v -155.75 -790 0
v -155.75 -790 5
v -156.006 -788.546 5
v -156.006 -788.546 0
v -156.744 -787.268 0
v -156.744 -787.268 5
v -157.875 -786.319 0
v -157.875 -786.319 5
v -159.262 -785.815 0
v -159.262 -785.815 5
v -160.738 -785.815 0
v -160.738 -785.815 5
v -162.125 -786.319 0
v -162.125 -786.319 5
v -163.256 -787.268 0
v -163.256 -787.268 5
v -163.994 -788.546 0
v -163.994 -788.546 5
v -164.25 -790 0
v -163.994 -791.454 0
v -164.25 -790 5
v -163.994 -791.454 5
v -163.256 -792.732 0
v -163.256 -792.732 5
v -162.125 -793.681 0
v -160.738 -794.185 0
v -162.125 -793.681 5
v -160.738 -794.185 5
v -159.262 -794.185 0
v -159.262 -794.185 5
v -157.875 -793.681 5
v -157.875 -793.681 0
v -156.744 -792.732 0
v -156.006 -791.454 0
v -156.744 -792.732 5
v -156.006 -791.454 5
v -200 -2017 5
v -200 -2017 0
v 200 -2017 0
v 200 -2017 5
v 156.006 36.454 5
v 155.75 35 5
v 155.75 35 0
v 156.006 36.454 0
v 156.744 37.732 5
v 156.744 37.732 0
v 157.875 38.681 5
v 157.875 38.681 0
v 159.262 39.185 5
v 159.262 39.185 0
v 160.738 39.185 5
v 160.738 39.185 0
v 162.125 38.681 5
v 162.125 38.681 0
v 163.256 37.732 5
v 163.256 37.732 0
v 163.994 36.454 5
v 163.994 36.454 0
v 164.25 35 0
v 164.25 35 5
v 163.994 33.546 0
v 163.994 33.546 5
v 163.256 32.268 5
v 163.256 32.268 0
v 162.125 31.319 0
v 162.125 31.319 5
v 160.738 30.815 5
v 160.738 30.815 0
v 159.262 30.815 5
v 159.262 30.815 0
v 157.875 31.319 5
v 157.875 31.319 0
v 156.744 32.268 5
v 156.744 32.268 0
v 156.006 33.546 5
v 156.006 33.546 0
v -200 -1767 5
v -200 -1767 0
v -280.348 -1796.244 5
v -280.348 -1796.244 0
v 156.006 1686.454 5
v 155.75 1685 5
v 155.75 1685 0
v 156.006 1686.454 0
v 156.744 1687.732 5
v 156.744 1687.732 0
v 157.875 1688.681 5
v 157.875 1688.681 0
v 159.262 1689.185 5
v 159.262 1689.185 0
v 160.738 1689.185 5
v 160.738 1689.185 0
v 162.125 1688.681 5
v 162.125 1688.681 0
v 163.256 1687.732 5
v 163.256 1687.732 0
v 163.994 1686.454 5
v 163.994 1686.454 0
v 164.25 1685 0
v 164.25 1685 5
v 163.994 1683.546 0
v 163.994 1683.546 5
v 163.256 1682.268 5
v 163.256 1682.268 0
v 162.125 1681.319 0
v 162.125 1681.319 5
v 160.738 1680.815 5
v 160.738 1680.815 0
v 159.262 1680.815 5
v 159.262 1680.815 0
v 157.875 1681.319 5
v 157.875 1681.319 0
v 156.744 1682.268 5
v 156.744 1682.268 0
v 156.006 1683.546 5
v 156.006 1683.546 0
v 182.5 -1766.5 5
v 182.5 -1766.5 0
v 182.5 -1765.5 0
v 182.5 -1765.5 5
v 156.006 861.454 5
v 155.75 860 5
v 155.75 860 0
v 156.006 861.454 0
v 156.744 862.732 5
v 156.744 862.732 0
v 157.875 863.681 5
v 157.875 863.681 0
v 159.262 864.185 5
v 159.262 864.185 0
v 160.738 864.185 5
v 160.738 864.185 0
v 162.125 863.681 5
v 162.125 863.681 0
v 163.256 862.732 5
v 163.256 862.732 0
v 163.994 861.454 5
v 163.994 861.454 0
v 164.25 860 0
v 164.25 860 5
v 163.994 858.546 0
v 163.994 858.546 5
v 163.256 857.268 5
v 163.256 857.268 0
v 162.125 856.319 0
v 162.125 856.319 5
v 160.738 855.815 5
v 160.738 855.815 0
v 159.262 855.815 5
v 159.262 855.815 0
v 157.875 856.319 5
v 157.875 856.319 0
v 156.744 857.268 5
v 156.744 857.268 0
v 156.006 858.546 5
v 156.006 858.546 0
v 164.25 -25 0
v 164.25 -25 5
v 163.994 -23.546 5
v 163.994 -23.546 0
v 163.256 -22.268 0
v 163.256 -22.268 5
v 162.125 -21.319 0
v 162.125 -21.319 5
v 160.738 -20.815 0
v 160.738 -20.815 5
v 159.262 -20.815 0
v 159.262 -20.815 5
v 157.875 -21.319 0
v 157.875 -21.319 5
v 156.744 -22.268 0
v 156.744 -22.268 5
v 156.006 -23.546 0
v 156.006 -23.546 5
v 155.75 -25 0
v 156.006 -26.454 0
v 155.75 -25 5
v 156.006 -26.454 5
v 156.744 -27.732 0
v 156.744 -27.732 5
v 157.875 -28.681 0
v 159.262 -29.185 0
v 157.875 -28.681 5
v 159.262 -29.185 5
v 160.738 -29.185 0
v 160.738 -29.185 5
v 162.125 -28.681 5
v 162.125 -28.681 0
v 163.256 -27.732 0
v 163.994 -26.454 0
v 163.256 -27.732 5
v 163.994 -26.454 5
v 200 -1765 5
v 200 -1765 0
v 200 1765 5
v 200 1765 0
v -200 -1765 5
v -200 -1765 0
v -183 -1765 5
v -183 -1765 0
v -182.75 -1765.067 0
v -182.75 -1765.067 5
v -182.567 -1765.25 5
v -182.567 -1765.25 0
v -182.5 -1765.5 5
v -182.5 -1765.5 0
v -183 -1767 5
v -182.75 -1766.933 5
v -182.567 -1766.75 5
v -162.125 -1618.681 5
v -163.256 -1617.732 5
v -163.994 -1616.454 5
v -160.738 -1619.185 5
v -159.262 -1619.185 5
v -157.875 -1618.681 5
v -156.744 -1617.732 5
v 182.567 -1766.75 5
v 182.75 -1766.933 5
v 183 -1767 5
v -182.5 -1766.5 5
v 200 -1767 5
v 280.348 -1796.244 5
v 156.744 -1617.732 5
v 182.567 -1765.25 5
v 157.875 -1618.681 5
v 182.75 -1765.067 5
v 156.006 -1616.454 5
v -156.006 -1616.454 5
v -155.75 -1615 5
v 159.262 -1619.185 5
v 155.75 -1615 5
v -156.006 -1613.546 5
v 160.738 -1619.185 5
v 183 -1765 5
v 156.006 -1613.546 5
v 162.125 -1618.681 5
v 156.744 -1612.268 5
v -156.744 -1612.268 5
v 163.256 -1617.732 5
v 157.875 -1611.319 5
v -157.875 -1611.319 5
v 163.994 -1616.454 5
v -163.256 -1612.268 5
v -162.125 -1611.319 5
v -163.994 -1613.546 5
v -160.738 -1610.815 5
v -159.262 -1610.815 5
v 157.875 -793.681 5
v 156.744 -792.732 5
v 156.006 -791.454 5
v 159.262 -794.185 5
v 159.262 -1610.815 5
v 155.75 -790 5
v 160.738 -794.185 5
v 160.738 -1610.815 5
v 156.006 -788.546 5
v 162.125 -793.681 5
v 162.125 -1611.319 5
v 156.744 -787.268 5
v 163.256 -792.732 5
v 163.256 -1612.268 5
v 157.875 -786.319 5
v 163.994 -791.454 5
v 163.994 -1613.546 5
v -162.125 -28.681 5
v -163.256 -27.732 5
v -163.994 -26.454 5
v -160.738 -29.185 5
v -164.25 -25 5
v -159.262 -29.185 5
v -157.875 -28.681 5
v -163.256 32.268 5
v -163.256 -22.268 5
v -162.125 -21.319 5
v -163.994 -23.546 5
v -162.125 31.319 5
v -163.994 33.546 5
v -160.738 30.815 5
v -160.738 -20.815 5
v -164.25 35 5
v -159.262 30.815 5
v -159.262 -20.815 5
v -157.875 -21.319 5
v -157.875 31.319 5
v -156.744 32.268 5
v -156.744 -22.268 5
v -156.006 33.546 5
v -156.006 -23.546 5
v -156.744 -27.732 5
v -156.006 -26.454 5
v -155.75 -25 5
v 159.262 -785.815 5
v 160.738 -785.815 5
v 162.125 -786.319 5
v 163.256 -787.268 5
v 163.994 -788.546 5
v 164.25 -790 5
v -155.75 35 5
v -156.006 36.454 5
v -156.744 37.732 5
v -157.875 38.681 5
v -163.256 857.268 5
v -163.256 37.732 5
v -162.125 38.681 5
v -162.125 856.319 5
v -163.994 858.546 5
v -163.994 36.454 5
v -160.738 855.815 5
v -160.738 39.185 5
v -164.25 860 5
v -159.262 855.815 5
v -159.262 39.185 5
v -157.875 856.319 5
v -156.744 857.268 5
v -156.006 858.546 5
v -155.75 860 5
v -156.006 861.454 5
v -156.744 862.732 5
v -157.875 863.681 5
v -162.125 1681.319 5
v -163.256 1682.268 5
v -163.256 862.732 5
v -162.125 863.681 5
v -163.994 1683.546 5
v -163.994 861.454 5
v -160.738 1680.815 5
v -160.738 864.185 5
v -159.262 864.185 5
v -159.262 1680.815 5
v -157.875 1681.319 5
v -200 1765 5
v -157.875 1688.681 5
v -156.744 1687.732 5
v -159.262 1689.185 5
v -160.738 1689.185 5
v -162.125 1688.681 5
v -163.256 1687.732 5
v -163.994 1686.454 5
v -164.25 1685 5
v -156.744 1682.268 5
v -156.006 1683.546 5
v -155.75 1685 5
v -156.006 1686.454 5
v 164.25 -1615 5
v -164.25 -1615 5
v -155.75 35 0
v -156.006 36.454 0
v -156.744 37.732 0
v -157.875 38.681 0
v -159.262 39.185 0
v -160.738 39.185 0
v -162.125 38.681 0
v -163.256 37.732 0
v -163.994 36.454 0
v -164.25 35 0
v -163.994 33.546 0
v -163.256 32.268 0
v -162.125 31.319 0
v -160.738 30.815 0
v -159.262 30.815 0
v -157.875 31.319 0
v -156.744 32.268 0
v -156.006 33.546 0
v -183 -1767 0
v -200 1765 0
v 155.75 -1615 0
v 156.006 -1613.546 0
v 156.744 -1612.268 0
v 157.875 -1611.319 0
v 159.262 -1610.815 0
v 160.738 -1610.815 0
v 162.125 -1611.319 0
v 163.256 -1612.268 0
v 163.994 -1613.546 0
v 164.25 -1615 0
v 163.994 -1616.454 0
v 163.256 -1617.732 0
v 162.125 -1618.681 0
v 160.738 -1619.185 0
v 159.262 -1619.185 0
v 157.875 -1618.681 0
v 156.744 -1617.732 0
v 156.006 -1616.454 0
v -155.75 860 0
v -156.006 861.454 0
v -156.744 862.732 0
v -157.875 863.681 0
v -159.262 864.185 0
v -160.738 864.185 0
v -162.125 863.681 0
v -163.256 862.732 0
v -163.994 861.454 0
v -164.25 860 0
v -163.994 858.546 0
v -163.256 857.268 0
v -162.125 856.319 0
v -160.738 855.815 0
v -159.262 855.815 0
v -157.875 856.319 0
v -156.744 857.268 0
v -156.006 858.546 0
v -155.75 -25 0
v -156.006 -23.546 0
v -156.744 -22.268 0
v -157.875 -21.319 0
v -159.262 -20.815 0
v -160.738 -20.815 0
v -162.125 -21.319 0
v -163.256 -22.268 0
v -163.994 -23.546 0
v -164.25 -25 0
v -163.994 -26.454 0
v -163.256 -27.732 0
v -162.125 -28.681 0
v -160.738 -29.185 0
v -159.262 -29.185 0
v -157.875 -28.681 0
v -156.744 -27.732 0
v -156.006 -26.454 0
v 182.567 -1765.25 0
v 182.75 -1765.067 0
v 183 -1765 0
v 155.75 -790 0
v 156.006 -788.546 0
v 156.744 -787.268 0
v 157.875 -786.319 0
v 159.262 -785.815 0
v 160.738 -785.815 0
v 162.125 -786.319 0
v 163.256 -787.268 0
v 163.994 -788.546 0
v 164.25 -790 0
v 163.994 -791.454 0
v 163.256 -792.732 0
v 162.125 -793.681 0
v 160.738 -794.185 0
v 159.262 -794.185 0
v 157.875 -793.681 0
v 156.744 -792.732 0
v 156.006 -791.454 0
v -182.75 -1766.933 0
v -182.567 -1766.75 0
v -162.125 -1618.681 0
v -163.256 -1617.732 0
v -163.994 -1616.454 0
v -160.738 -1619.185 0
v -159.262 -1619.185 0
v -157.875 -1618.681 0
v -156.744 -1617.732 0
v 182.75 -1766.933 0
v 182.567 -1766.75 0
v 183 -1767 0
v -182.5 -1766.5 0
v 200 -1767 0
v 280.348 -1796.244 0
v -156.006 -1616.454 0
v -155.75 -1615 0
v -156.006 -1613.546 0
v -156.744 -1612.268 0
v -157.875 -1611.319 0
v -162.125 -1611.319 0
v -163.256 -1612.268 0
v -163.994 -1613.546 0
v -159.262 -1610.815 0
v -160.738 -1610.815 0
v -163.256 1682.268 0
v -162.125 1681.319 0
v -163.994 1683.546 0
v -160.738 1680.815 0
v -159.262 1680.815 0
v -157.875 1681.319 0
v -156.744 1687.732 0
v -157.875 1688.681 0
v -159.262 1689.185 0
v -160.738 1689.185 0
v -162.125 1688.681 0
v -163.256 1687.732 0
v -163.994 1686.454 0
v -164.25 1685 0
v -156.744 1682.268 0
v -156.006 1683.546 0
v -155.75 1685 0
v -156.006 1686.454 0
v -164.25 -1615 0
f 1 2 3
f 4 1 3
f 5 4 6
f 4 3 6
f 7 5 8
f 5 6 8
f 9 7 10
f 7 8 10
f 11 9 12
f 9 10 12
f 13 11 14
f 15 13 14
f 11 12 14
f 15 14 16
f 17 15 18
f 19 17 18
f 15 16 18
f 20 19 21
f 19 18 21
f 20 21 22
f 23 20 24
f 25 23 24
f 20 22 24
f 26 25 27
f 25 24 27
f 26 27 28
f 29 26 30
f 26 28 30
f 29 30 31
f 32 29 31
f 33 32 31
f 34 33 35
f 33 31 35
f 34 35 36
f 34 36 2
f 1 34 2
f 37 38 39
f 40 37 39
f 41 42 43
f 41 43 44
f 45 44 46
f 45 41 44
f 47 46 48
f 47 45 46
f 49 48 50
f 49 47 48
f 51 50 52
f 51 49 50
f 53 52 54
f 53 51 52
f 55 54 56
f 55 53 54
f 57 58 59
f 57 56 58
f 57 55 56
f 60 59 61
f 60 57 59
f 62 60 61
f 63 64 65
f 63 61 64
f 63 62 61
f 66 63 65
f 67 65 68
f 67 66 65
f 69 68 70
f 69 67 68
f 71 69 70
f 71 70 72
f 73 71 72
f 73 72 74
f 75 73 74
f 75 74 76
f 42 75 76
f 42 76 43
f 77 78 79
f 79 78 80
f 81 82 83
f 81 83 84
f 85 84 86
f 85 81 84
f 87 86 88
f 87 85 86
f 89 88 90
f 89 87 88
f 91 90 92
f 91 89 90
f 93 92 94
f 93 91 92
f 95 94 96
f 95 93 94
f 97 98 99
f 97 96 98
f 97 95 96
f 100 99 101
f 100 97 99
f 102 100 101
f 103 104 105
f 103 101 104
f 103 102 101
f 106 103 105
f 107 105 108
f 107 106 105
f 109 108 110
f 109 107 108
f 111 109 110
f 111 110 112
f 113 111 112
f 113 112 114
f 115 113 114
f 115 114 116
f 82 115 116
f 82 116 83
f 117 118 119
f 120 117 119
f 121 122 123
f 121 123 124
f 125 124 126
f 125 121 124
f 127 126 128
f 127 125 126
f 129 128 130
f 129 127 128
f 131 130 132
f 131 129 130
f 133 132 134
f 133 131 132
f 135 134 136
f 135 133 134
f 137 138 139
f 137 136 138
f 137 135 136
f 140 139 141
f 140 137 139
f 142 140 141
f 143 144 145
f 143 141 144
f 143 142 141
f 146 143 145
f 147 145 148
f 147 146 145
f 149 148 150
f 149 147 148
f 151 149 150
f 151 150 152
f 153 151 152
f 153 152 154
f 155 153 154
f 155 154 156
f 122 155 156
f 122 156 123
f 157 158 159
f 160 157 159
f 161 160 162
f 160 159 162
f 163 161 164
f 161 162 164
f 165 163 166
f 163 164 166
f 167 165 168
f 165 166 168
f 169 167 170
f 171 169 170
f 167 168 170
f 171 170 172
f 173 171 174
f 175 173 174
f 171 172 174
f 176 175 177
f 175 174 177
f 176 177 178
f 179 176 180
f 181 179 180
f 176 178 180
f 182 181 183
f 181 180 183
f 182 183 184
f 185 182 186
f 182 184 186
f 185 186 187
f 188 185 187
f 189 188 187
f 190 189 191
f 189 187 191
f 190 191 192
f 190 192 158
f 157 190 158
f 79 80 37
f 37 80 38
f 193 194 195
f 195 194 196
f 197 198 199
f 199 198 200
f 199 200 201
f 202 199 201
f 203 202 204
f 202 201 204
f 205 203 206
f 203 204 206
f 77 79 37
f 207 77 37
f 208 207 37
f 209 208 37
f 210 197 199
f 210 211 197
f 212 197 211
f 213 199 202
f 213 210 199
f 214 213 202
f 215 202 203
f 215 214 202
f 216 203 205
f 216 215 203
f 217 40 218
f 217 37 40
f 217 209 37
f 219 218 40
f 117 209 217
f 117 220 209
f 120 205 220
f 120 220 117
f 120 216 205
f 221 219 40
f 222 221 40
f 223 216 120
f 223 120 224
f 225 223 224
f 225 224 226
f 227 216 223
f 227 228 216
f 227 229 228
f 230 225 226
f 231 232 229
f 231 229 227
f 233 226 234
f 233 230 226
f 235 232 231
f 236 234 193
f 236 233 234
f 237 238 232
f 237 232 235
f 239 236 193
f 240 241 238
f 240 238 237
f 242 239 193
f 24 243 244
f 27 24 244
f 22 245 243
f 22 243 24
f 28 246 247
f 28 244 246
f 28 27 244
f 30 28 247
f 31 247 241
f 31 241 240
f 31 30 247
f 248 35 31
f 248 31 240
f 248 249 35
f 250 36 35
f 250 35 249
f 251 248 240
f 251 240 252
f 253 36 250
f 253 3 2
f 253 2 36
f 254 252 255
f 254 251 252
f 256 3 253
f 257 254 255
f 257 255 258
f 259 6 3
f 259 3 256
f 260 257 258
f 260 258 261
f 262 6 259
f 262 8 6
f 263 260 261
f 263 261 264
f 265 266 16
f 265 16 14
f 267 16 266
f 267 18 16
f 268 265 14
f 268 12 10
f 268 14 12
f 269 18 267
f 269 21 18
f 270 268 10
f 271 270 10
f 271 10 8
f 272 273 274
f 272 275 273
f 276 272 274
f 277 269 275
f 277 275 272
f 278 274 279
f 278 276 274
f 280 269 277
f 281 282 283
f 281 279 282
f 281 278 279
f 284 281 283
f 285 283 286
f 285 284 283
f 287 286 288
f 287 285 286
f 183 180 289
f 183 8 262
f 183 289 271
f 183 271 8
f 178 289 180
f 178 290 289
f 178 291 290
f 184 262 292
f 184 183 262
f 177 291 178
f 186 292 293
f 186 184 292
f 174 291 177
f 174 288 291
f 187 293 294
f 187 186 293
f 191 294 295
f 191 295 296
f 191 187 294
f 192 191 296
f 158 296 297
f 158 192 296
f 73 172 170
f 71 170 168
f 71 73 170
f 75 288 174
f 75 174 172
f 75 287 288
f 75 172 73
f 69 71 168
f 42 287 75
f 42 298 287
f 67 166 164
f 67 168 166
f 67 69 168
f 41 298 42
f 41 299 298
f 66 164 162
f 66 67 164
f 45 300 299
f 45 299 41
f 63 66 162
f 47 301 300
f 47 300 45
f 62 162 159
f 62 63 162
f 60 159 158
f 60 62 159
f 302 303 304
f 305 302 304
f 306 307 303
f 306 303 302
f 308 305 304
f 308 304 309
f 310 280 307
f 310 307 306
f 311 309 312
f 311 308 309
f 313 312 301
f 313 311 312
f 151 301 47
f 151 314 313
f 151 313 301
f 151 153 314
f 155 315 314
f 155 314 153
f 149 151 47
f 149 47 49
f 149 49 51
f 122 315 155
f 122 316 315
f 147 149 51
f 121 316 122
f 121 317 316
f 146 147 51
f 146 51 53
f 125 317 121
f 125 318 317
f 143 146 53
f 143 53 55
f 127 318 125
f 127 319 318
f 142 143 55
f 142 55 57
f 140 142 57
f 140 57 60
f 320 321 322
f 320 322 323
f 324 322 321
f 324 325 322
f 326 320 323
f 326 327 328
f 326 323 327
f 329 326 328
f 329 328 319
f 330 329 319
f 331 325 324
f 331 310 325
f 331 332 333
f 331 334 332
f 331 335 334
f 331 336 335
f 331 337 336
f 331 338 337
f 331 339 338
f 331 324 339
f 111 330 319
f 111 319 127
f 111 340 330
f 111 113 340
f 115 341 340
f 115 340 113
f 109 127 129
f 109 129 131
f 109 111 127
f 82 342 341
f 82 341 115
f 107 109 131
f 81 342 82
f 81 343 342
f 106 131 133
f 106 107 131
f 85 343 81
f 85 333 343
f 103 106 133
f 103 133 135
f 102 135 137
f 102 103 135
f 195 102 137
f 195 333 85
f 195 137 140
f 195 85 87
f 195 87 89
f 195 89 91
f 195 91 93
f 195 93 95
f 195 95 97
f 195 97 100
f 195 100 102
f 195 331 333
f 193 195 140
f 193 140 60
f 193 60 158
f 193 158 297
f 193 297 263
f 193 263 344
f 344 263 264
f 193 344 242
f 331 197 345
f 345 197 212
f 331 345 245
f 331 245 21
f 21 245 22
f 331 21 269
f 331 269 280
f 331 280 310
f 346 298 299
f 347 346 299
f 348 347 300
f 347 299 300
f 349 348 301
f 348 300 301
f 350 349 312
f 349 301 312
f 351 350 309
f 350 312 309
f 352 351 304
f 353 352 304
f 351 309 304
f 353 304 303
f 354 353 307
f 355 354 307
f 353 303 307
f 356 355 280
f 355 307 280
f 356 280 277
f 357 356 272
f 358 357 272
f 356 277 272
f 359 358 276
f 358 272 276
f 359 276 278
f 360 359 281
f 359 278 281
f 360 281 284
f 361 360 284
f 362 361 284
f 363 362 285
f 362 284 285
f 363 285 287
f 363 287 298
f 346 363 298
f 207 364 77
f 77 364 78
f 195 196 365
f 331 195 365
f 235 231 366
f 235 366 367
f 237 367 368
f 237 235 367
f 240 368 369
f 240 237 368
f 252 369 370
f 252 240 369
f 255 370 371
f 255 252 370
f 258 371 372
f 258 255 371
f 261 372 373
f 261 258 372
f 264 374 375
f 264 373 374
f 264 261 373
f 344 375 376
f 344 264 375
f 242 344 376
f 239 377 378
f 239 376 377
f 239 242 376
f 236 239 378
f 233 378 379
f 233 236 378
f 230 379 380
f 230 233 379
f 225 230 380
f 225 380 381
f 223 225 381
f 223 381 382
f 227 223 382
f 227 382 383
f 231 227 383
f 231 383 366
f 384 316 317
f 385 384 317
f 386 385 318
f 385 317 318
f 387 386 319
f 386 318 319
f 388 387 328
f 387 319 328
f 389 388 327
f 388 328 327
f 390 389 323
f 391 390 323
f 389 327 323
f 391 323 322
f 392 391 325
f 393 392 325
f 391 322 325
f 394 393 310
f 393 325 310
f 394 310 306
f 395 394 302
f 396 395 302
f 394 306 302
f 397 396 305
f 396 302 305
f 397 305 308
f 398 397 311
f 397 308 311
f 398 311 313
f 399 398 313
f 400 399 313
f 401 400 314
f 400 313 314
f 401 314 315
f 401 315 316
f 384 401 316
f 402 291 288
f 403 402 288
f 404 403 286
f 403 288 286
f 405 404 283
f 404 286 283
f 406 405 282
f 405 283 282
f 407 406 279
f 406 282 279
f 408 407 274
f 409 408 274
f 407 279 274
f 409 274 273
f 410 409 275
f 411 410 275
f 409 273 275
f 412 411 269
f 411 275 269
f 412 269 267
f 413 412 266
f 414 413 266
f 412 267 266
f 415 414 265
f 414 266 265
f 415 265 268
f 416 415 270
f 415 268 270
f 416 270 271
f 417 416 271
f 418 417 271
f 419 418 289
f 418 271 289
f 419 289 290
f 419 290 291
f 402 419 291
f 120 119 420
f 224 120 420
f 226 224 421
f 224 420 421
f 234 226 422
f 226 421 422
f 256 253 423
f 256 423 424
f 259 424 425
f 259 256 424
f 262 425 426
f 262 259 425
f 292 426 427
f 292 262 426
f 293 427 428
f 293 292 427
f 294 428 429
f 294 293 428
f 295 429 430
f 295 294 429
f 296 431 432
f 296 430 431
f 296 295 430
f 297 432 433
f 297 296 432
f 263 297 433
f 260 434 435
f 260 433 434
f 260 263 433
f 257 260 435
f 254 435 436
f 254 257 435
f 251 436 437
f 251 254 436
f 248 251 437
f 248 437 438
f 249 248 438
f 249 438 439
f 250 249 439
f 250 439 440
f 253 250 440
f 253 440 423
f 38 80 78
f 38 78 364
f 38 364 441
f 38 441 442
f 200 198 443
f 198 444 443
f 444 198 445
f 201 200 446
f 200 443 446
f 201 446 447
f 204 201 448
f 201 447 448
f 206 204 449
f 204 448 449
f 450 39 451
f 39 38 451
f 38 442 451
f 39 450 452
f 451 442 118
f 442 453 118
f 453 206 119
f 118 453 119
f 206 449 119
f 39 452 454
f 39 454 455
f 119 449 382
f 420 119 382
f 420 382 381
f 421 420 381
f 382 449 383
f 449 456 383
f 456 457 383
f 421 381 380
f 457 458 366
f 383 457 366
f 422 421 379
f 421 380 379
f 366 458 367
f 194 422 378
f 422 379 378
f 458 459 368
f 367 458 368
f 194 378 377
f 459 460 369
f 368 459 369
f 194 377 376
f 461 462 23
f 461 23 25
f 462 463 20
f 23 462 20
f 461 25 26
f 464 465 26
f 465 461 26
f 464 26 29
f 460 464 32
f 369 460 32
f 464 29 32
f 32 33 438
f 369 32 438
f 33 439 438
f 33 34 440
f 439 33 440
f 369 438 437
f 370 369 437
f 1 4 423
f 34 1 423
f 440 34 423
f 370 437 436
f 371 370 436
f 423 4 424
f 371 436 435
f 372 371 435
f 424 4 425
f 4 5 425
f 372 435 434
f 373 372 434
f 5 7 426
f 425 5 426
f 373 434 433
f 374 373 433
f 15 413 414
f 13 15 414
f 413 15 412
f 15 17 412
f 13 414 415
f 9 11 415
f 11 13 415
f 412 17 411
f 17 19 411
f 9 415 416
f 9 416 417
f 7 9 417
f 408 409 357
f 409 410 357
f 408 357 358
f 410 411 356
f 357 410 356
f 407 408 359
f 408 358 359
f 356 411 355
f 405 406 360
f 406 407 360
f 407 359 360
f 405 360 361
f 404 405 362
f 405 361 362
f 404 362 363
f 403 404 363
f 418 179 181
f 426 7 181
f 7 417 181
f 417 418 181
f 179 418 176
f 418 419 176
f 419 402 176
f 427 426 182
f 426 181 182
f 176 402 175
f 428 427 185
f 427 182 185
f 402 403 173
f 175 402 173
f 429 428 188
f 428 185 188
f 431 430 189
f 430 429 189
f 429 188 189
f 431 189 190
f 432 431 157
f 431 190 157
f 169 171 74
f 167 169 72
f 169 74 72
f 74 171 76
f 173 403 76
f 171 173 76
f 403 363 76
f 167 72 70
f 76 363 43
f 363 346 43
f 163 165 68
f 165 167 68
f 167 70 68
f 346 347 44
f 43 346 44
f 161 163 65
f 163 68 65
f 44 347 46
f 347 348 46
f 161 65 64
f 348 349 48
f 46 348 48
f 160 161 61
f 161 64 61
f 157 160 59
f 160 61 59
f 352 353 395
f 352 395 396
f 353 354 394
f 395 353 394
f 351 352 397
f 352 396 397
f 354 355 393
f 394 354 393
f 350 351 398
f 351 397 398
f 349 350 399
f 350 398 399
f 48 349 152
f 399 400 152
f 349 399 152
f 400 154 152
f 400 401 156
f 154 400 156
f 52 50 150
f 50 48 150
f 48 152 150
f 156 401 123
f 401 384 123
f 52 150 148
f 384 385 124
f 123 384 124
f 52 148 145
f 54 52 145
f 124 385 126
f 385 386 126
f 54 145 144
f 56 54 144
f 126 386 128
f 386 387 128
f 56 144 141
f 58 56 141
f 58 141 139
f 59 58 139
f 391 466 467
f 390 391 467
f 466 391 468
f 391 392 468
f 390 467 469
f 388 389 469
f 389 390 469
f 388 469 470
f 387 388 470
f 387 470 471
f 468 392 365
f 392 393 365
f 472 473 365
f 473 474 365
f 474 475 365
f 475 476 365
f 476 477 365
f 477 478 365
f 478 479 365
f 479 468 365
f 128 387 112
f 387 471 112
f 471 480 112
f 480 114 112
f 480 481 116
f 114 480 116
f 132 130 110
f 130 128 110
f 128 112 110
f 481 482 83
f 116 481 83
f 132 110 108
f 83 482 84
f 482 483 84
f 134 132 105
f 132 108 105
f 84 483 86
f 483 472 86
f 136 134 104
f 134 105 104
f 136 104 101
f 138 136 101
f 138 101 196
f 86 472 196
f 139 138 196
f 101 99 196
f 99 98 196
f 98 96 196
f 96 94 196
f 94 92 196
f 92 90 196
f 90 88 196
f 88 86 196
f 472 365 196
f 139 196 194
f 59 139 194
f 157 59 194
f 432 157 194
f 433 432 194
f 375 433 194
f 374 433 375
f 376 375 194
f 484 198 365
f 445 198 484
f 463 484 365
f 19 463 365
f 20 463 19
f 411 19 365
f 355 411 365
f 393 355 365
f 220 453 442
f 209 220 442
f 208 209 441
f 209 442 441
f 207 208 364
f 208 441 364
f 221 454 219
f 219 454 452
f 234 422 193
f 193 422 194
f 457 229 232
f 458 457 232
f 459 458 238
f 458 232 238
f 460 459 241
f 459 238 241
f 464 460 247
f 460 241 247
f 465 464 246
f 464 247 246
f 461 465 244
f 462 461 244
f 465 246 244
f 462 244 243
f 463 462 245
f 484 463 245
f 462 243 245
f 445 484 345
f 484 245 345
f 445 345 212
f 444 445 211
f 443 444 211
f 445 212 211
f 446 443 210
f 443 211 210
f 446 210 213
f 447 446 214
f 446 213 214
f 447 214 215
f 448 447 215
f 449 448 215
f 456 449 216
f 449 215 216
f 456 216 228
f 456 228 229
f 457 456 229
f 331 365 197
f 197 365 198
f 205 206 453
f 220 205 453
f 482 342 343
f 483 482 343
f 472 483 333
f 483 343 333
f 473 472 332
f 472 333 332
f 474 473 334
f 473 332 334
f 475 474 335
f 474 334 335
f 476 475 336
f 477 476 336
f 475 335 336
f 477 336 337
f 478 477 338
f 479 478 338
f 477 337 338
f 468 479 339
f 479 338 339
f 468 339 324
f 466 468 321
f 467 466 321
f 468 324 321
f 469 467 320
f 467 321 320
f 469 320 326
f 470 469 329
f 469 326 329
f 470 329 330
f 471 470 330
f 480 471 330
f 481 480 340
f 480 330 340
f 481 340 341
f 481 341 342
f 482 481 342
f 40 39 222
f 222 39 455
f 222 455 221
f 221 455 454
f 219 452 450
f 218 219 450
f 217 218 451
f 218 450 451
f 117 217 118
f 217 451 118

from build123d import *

# Parameters (mm, degrees)
F1_DEPTH = 5
F2_R     = 4.25
F3_DEPTH = 5.001
F4_R     = 4.25
F5_DEPTH = 5.001


# Not quite as in the source:
# - a pattern or mirror of a feature is missing from the dataset's text; its kind, count and spacing are read off the source's solid


with BuildPart() as f1:
    # F0 (on Top) → F1 (new body)
    with BuildSketch(Plane.XY):
        with BuildLine():
            Line((200, -1765), (200, 1765))
            Line((200, 1765), (-200, 1765))
            Line((-200, 1765), (-200, -1765))
            Line((-200, -1765), (-183, -1765))
            ThreePointArc((-183, -1765), (-182.6464466094, -1765.1464466094), (-182.5, -1765.5))
            Line((-182.5, -1765.5), (-182.5, -1766.5))
            ThreePointArc((-182.5, -1766.5), (-182.6464466094, -1766.8535533906), (-183, -1767))
            Line((-183, -1767), (-200, -1767))
            Line((-200, -1767), (-280.3484512108, -1796.2444446101))
            Line((-280.3484512108, -1796.2444446101), (-200, -2017))
            Line((-200, -2017), (200, -2017))
            Line((200, -2017), (280.3484512108, -1796.2444446101))
            Line((280.3484512108, -1796.2444446101), (200, -1767))
            Line((200, -1767), (183, -1767))
            ThreePointArc((183, -1767), (182.6464466094, -1766.8535533906), (182.5, -1766.5))
            Line((182.5, -1766.5), (182.5, -1765.5))
            ThreePointArc((182.5, -1765.5), (182.6464466094, -1765.1464466094), (183, -1765))
            Line((183, -1765), (200, -1765))
        make_face()
    extrude(amount=F1_DEPTH)

    # F2 (on face) → F3 (cut, through all)
    with BuildSketch(Plane.XY.offset(5)):
        with Locations((-160, 1685)):
            Circle(F2_R)
        with Locations((-160, 860)):
            Circle(F2_R)
        with Locations((-160, 35)):
            Circle(F2_R)
        with Locations((-160, -790)):
            Circle(F2_R)
        with Locations((-160, -1615)):
            Circle(F2_R)
    f3 = extrude(amount=-F3_DEPTH, mode=Mode.SUBTRACT)

    # F3_copies: F3 across plane
    add(f3.mirror(Plane(origin=(0, 0, 0), x_dir=(0, 0, 1), z_dir=(1, 0, 0))), mode=Mode.SUBTRACT)

    # F4 (on face) → F5 (cut, through all)
    with BuildSketch(Plane.XY.offset(5)):
        with Locations((-160, -25)):
            Circle(F4_R)
        with Locations((160, -25)):
            Circle(F4_R)
    extrude(amount=-F5_DEPTH, mode=Mode.SUBTRACT)


solid = f1.part
